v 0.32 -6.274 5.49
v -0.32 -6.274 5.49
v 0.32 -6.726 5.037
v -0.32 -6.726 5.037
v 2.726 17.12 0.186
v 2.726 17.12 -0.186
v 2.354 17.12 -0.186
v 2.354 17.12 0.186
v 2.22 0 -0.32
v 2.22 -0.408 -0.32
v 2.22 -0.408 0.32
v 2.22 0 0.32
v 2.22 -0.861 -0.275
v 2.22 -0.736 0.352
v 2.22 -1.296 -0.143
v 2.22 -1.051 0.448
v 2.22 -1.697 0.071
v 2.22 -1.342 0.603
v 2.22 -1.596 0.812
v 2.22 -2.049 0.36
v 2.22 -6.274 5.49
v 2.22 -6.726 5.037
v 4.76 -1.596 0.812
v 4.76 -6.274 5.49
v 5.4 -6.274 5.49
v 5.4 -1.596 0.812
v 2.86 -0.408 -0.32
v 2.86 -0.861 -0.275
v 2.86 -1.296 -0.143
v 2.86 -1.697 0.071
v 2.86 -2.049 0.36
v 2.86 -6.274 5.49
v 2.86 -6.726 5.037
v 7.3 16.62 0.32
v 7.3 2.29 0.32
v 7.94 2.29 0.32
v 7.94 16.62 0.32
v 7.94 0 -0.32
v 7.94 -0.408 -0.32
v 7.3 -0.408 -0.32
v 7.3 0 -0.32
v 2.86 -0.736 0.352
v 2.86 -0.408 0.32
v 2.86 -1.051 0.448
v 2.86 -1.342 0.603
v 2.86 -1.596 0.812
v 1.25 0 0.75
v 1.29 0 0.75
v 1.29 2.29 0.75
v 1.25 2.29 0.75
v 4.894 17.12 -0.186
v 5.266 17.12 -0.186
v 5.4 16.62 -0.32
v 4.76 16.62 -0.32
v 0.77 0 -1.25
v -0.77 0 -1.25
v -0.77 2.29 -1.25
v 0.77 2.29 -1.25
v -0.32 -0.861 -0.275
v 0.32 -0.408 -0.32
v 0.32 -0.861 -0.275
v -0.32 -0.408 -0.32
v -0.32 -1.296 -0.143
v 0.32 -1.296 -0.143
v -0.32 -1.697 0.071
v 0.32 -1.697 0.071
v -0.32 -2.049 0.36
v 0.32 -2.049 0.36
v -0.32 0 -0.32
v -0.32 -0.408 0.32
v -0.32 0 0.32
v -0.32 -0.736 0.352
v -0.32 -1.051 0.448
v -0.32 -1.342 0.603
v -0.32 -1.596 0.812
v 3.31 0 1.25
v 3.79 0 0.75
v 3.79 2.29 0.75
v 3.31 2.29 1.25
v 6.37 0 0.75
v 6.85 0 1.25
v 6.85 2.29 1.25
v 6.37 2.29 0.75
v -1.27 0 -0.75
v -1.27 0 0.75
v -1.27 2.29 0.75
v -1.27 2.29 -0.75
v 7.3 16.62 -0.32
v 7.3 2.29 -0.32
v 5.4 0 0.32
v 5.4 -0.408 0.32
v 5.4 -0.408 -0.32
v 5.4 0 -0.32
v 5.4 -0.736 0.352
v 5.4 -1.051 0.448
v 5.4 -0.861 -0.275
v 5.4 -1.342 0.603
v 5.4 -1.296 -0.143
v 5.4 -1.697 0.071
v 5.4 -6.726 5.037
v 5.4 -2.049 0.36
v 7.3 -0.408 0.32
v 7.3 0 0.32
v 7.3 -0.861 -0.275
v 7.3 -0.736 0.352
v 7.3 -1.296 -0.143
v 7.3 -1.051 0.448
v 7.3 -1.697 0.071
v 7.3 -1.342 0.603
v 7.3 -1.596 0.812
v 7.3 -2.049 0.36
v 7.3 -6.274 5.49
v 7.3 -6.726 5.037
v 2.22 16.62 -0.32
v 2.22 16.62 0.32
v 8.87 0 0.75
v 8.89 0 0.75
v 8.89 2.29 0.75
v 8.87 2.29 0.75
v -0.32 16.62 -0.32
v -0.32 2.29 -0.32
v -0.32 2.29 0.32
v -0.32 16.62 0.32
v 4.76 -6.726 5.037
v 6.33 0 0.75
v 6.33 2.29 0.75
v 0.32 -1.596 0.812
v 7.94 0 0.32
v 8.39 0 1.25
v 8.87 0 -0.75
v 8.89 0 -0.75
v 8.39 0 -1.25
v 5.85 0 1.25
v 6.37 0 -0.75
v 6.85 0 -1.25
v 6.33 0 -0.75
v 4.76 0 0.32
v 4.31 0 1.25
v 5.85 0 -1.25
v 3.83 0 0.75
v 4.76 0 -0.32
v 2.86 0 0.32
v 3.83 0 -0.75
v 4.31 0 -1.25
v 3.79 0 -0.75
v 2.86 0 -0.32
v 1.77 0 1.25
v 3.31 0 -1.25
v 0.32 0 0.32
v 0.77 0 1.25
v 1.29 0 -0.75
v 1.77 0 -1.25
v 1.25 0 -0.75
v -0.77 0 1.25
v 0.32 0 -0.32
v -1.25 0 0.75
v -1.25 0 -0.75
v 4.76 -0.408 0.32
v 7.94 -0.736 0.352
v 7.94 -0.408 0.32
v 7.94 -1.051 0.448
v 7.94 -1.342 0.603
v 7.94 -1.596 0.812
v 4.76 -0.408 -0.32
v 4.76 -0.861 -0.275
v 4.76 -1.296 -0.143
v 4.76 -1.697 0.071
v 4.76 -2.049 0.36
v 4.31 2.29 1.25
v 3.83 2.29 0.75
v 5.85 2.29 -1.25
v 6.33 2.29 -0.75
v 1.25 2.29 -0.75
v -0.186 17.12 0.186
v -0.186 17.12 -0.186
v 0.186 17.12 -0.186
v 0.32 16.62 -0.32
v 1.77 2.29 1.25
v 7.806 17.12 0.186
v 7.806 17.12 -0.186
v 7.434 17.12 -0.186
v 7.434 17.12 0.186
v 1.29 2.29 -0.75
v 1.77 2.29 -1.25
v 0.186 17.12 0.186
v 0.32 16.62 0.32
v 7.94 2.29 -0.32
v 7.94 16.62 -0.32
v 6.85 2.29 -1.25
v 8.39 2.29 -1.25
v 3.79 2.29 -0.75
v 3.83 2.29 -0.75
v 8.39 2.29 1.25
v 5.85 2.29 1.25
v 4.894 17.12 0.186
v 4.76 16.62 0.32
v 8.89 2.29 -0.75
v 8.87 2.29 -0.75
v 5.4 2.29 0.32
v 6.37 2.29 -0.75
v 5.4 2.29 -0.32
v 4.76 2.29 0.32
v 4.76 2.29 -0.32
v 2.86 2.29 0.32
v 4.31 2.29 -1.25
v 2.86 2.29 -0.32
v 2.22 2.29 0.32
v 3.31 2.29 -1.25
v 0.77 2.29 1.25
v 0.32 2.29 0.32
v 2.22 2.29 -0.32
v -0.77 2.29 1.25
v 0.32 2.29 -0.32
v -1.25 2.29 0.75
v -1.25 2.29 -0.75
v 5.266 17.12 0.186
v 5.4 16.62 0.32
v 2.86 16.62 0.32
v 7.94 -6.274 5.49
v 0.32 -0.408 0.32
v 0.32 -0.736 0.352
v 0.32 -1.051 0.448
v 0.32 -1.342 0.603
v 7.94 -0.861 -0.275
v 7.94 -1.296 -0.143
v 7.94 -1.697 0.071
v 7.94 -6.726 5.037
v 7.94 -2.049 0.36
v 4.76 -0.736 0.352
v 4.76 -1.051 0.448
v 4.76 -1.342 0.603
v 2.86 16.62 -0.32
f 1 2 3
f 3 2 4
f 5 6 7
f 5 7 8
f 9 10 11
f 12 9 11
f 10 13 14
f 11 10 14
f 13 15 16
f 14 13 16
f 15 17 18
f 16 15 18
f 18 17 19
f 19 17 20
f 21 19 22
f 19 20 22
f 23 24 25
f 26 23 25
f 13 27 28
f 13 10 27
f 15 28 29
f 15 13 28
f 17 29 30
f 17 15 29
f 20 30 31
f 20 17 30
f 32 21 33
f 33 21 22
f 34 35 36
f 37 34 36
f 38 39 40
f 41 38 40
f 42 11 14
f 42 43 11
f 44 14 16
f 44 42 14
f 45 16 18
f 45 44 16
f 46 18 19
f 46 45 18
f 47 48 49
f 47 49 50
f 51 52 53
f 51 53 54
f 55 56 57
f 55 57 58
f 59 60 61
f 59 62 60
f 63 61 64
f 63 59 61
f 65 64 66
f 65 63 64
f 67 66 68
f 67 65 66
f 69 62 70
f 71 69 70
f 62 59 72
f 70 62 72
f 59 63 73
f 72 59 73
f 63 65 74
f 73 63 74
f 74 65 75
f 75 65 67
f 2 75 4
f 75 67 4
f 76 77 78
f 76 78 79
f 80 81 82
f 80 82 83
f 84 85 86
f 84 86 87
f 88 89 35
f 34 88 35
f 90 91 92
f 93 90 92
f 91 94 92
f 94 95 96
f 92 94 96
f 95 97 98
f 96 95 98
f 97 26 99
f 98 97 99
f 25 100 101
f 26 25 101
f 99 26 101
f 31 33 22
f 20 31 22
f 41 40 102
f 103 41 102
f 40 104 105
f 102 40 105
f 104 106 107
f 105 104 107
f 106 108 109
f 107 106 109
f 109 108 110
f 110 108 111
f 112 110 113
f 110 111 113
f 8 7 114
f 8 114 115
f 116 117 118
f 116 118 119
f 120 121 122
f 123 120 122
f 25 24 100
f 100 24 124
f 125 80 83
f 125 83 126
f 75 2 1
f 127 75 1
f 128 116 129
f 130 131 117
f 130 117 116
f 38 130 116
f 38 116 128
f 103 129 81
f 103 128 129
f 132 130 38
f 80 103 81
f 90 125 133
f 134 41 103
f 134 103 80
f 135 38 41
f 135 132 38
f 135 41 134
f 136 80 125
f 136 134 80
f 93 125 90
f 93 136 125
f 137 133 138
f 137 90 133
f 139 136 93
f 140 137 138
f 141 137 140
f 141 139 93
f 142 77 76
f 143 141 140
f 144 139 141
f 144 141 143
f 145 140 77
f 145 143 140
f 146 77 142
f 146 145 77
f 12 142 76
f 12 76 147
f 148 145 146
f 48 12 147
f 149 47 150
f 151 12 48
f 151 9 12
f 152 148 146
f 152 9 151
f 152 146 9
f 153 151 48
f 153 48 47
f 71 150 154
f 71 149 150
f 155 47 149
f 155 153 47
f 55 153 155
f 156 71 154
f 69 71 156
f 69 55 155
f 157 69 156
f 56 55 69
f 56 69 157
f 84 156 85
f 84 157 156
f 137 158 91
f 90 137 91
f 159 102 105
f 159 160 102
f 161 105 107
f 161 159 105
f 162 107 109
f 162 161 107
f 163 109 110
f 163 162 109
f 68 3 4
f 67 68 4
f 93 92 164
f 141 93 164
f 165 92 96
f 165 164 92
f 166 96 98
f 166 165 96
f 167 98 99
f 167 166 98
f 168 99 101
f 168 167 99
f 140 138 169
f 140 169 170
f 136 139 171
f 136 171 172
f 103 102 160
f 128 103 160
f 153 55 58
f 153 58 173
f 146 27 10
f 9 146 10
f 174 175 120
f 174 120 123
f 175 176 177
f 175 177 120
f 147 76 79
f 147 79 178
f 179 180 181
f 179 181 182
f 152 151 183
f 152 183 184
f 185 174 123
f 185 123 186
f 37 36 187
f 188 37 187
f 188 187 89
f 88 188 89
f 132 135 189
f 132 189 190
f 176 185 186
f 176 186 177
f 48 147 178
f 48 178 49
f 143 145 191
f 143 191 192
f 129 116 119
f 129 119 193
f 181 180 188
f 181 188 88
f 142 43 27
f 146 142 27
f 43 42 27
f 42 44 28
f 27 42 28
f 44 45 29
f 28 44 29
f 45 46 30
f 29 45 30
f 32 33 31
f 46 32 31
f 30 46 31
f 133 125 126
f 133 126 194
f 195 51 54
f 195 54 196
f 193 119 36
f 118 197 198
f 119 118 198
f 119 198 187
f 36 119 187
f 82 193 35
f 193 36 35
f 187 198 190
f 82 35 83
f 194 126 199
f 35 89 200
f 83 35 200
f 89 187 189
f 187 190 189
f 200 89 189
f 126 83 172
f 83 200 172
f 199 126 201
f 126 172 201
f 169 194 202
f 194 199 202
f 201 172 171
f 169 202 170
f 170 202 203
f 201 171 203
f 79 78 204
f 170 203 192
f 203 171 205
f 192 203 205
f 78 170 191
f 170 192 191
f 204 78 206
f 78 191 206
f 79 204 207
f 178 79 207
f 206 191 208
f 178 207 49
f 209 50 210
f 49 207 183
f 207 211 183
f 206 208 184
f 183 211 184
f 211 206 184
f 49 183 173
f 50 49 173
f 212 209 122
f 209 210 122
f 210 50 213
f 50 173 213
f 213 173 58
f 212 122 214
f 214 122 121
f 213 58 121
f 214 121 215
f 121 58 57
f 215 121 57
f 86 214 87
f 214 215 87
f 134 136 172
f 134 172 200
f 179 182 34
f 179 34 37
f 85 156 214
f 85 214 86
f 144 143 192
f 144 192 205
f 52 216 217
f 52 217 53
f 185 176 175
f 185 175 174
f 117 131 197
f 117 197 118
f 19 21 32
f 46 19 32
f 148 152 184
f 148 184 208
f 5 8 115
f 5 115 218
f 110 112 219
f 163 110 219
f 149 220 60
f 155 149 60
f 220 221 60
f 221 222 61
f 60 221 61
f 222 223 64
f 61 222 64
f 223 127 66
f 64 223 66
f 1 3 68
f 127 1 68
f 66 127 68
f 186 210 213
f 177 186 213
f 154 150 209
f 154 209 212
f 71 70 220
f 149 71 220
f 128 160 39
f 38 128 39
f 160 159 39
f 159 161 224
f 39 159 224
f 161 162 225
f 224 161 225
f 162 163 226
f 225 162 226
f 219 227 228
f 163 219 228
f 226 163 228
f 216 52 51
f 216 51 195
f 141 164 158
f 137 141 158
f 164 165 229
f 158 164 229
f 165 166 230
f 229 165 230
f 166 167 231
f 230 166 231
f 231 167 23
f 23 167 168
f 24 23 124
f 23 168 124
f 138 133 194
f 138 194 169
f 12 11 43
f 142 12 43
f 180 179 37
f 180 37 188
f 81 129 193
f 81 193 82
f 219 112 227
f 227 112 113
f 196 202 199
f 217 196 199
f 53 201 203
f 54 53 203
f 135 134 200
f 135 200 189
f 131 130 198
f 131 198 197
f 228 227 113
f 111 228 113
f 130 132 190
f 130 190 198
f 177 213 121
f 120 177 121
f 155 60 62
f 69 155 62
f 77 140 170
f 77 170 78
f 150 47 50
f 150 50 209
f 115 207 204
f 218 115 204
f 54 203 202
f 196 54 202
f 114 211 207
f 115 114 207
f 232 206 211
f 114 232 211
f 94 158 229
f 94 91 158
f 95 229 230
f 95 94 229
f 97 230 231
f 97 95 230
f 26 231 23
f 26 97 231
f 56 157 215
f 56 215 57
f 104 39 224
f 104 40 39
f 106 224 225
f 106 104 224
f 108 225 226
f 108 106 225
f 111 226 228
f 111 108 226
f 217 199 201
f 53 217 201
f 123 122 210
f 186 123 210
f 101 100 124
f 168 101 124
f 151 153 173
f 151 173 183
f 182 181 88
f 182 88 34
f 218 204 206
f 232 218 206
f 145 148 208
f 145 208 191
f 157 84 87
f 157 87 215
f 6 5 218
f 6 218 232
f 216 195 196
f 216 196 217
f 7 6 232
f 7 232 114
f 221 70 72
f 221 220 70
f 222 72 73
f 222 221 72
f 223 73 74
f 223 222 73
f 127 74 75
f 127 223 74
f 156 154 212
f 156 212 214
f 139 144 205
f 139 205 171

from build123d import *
from OCP.BRepFilletAPI import BRepFilletAPI_MakeChamfer

# Parameters (mm, degrees)
BOSS_EXTRUDE1_DEPTH         = 2.29
SKETCH3_W                   = 0.64
SKETCH3_H                   = 0.64
CHAMFER3_SIZE               = 0.5
CHAMFER3_SIZE2              = 0.133974596
LPATTERN1_COUNT             = 4
LPATTERN1_PITCH             = 2.54
CHAMFER3_OF_LPATTERN1_SIZE  = 0.5
CHAMFER3_OF_LPATTERN1_SIZE2 = 0.133974596


with BuildPart() as part:
    # Sketch1 → Boss-Extrude1 (new body)
    with BuildSketch(Plane(origin=(0, 0, 0), x_dir=(1, 0, 0), z_dir=(0, 1, 0))):
        Polygon((-0.77, 1.25), (0.77, 1.25), (1.25, 0.75), (1.27, 0.75), (1.27, -0.75), (1.25, -0.75), (0.77, -1.25), (-0.77, -1.25), (-1.25, -0.75), (-1.27, -0.75), (-1.27, 0.75), (-1.25, 0.75), align=None)
    boss_extrude1 = extrude(amount=BOSS_EXTRUDE1_DEPTH)

    # Sweep1: sweep along a path in Sketch2
    with BuildLine(Plane(origin=(0, 0, 0), x_dir=(0, 0, -1), z_dir=(1, 0, 0))) as sweep1_path:
        Line((0, 17.12), (0, -0.408142235))
        ThreePointArc((0, -0.408142235), (-0.152240935, -1.1735091), (-0.585786438, -1.822355798))
        Line((-0.585786438, -1.822355798), (-5.26343064, -6.5))
    # Sketch3 → Sweep1 (sweep)
    with BuildSketch(Plane(origin=(0, 17.12, 0), x_dir=(1, 0, 0), z_dir=(0, 1, 0))):
        Rectangle(SKETCH3_W, SKETCH3_H)
    sweep1 = sweep(path=sweep1_path.line)

    # Chamfer3: one chamfer whose edges measure the first distance from different faces: ONE call of the kernel's chamfer builder (chamfer() names one face for all edges)
    chamfer3_edges_1 = [part.edges().sort_by_distance(p)[0] for p in [
        (0.32, 17.12, 0),
    ]]
    chamfer3_side_1 = [part.faces().sort_by_distance(p)[0] for p in [
        (0.32, 9.705, 0),
    ]]
    chamfer3_edges_2 = [part.edges().sort_by_distance(p)[0] for p in [
        (0, 17.12, -0.32),
    ]]
    chamfer3_side_2 = [part.faces().sort_by_distance(p)[0] for p in [
        (0, 9.705, -0.32),
    ]]
    chamfer3_edges_3 = [part.edges().sort_by_distance(p)[0] for p in [
        (-0.32, 17.12, 0),
    ]]
    chamfer3_side_3 = [part.faces().sort_by_distance(p)[0] for p in [
        (-0.32, 9.705, 0),
    ]]
    chamfer3_edges_4 = [part.edges().sort_by_distance(p)[0] for p in [
        (0, 17.12, 0.32),
    ]]
    chamfer3_side_4 = [part.faces().sort_by_distance(p)[0] for p in [
        (0, 9.705, 0.32),
    ]]
    chamfer3 = BRepFilletAPI_MakeChamfer(part.part.solid().wrapped)
    for e in chamfer3_edges_1:
        chamfer3.Add(CHAMFER3_SIZE, CHAMFER3_SIZE2, e.wrapped, chamfer3_side_1[0].wrapped)  # the first distance lies on this face
    for e in chamfer3_edges_2:
        chamfer3.Add(CHAMFER3_SIZE, CHAMFER3_SIZE2, e.wrapped, chamfer3_side_2[0].wrapped)  # the first distance lies on this face
    for e in chamfer3_edges_3:
        chamfer3.Add(CHAMFER3_SIZE, CHAMFER3_SIZE2, e.wrapped, chamfer3_side_3[0].wrapped)  # the first distance lies on this face
    for e in chamfer3_edges_4:
        chamfer3.Add(CHAMFER3_SIZE, CHAMFER3_SIZE2, e.wrapped, chamfer3_side_4[0].wrapped)  # the first distance lies on this face
    add(Compound.cast(chamfer3.Shape()), mode=Mode.REPLACE)

    # LPattern1: Boss-Extrude1, Sweep1 ×4
    with Locations(*[(i * LPATTERN1_PITCH, 0, 0) for i in range(1, LPATTERN1_COUNT)]):
        add(boss_extrude1)
        add(sweep1)

    # Chamfer3 of LPattern1: one chamfer whose edges measure the first distance from different faces: ONE call of the kernel's chamfer builder (chamfer() names one face for all edges)
    chamfer3_of_lpattern1_edges_1 = [part.edges().sort_by_distance(p)[0] for p in [
        (2.86, 17.12, 0),
    ]]
    chamfer3_of_lpattern1_side_1 = [part.faces().sort_by_distance(p)[0] for p in [
        (2.86, 9.705, 0),
    ]]
    chamfer3_of_lpattern1_edges_2 = [part.edges().sort_by_distance(p)[0] for p in [
        (2.54, 17.12, -0.32),
    ]]
    chamfer3_of_lpattern1_side_2 = [part.faces().sort_by_distance(p)[0] for p in [
        (2.54, 9.705, -0.32),
    ]]
    chamfer3_of_lpattern1_edges_3 = [part.edges().sort_by_distance(p)[0] for p in [
        (2.22, 17.12, 0),
    ]]
    chamfer3_of_lpattern1_side_3 = [part.faces().sort_by_distance(p)[0] for p in [
        (2.22, 9.705, 0),
    ]]
    chamfer3_of_lpattern1_edges_4 = [part.edges().sort_by_distance(p)[0] for p in [
        (2.54, 17.12, 0.32),
    ]]
    chamfer3_of_lpattern1_side_4 = [part.faces().sort_by_distance(p)[0] for p in [
        (2.54, 9.705, 0.32),
    ]]
    chamfer3_of_lpattern1_edges_5 = [part.edges().sort_by_distance(p)[0] for p in [
        (5.4, 17.12, 0),
    ]]
    chamfer3_of_lpattern1_side_5 = [part.faces().sort_by_distance(p)[0] for p in [
        (5.4, 9.705, 0),
    ]]
    chamfer3_of_lpattern1_edges_6 = [part.edges().sort_by_distance(p)[0] for p in [
        (5.08, 17.12, -0.32),
    ]]
    chamfer3_of_lpattern1_side_6 = [part.faces().sort_by_distance(p)[0] for p in [
        (5.08, 9.705, -0.32),
    ]]
    chamfer3_of_lpattern1_edges_7 = [part.edges().sort_by_distance(p)[0] for p in [
        (4.76, 17.12, 0),
    ]]
    chamfer3_of_lpattern1_side_7 = [part.faces().sort_by_distance(p)[0] for p in [
        (4.76, 9.705, 0),
    ]]
    chamfer3_of_lpattern1_edges_8 = [part.edges().sort_by_distance(p)[0] for p in [
        (5.08, 17.12, 0.32),
    ]]
    chamfer3_of_lpattern1_side_8 = [part.faces().sort_by_distance(p)[0] for p in [
        (5.08, 9.705, 0.32),
    ]]
    chamfer3_of_lpattern1_edges_9 = [part.edges().sort_by_distance(p)[0] for p in [
        (7.94, 17.12, 0),
    ]]
    chamfer3_of_lpattern1_side_9 = [part.faces().sort_by_distance(p)[0] for p in [
        (7.94, 9.705, 0),
    ]]
    chamfer3_of_lpattern1_edges_10 = [part.edges().sort_by_distance(p)[0] for p in [
        (7.62, 17.12, -0.32),
    ]]
    chamfer3_of_lpattern1_side_10 = [part.faces().sort_by_distance(p)[0] for p in [
        (7.62, 9.705, -0.32),
    ]]
    chamfer3_of_lpattern1_edges_11 = [part.edges().sort_by_distance(p)[0] for p in [
        (7.3, 17.12, 0),
    ]]
    chamfer3_of_lpattern1_side_11 = [part.faces().sort_by_distance(p)[0] for p in [
        (7.3, 9.705, 0),
    ]]
    chamfer3_of_lpattern1_edges_12 = [part.edges().sort_by_distance(p)[0] for p in [
        (7.62, 17.12, 0.32),
    ]]
    chamfer3_of_lpattern1_side_12 = [part.faces().sort_by_distance(p)[0] for p in [
        (7.62, 9.705, 0.32),
    ]]
    chamfer3_of_lpattern1 = BRepFilletAPI_MakeChamfer(part.part.solid().wrapped)
    for e in chamfer3_of_lpattern1_edges_1:
        chamfer3_of_lpattern1.Add(CHAMFER3_OF_LPATTERN1_SIZE, CHAMFER3_OF_LPATTERN1_SIZE2, e.wrapped, chamfer3_of_lpattern1_side_1[0].wrapped)  # the first distance lies on this face
    for e in chamfer3_of_lpattern1_edges_2:
        chamfer3_of_lpattern1.Add(CHAMFER3_OF_LPATTERN1_SIZE, CHAMFER3_OF_LPATTERN1_SIZE2, e.wrapped, chamfer3_of_lpattern1_side_2[0].wrapped)  # the first distance lies on this face
    for e in chamfer3_of_lpattern1_edges_3:
        chamfer3_of_lpattern1.Add(CHAMFER3_OF_LPATTERN1_SIZE, CHAMFER3_OF_LPATTERN1_SIZE2, e.wrapped, chamfer3_of_lpattern1_side_3[0].wrapped)  # the first distance lies on this face
    for e in chamfer3_of_lpattern1_edges_4:
        chamfer3_of_lpattern1.Add(CHAMFER3_OF_LPATTERN1_SIZE, CHAMFER3_OF_LPATTERN1_SIZE2, e.wrapped, chamfer3_of_lpattern1_side_4[0].wrapped)  # the first distance lies on this face
    for e in chamfer3_of_lpattern1_edges_5:
        chamfer3_of_lpattern1.Add(CHAMFER3_OF_LPATTERN1_SIZE, CHAMFER3_OF_LPATTERN1_SIZE2, e.wrapped, chamfer3_of_lpattern1_side_5[0].wrapped)  # the first distance lies on this face
    for e in chamfer3_of_lpattern1_edges_6:
        chamfer3_of_lpattern1.Add(CHAMFER3_OF_LPATTERN1_SIZE, CHAMFER3_OF_LPATTERN1_SIZE2, e.wrapped, chamfer3_of_lpattern1_side_6[0].wrapped)  # the first distance lies on this face
    for e in chamfer3_of_lpattern1_edges_7:
        chamfer3_of_lpattern1.Add(CHAMFER3_OF_LPATTERN1_SIZE, CHAMFER3_OF_LPATTERN1_SIZE2, e.wrapped, chamfer3_of_lpattern1_side_7[0].wrapped)  # the first distance lies on this face
    for e in chamfer3_of_lpattern1_edges_8:
        chamfer3_of_lpattern1.Add(CHAMFER3_OF_LPATTERN1_SIZE, CHAMFER3_OF_LPATTERN1_SIZE2, e.wrapped, chamfer3_of_lpattern1_side_8[0].wrapped)  # the first distance lies on this face
    for e in chamfer3_of_lpattern1_edges_9:
        chamfer3_of_lpattern1.Add(CHAMFER3_OF_LPATTERN1_SIZE, CHAMFER3_OF_LPATTERN1_SIZE2, e.wrapped, chamfer3_of_lpattern1_side_9[0].wrapped)  # the first distance lies on this face
    for e in chamfer3_of_lpattern1_edges_10:
        chamfer3_of_lpattern1.Add(CHAMFER3_OF_LPATTERN1_SIZE, CHAMFER3_OF_LPATTERN1_SIZE2, e.wrapped, chamfer3_of_lpattern1_side_10[0].wrapped)  # the first distance lies on this face
    for e in chamfer3_of_lpattern1_edges_11:
        chamfer3_of_lpattern1.Add(CHAMFER3_OF_LPATTERN1_SIZE, CHAMFER3_OF_LPATTERN1_SIZE2, e.wrapped, chamfer3_of_lpattern1_side_11[0].wrapped)  # the first distance lies on this face
    for e in chamfer3_of_lpattern1_edges_12:
        chamfer3_of_lpattern1.Add(CHAMFER3_OF_LPATTERN1_SIZE, CHAMFER3_OF_LPATTERN1_SIZE2, e.wrapped, chamfer3_of_lpattern1_side_12[0].wrapped)  # the first distance lies on this face
    add(Compound.cast(chamfer3_of_lpattern1.Shape()), mode=Mode.REPLACE)


solid = part.part
